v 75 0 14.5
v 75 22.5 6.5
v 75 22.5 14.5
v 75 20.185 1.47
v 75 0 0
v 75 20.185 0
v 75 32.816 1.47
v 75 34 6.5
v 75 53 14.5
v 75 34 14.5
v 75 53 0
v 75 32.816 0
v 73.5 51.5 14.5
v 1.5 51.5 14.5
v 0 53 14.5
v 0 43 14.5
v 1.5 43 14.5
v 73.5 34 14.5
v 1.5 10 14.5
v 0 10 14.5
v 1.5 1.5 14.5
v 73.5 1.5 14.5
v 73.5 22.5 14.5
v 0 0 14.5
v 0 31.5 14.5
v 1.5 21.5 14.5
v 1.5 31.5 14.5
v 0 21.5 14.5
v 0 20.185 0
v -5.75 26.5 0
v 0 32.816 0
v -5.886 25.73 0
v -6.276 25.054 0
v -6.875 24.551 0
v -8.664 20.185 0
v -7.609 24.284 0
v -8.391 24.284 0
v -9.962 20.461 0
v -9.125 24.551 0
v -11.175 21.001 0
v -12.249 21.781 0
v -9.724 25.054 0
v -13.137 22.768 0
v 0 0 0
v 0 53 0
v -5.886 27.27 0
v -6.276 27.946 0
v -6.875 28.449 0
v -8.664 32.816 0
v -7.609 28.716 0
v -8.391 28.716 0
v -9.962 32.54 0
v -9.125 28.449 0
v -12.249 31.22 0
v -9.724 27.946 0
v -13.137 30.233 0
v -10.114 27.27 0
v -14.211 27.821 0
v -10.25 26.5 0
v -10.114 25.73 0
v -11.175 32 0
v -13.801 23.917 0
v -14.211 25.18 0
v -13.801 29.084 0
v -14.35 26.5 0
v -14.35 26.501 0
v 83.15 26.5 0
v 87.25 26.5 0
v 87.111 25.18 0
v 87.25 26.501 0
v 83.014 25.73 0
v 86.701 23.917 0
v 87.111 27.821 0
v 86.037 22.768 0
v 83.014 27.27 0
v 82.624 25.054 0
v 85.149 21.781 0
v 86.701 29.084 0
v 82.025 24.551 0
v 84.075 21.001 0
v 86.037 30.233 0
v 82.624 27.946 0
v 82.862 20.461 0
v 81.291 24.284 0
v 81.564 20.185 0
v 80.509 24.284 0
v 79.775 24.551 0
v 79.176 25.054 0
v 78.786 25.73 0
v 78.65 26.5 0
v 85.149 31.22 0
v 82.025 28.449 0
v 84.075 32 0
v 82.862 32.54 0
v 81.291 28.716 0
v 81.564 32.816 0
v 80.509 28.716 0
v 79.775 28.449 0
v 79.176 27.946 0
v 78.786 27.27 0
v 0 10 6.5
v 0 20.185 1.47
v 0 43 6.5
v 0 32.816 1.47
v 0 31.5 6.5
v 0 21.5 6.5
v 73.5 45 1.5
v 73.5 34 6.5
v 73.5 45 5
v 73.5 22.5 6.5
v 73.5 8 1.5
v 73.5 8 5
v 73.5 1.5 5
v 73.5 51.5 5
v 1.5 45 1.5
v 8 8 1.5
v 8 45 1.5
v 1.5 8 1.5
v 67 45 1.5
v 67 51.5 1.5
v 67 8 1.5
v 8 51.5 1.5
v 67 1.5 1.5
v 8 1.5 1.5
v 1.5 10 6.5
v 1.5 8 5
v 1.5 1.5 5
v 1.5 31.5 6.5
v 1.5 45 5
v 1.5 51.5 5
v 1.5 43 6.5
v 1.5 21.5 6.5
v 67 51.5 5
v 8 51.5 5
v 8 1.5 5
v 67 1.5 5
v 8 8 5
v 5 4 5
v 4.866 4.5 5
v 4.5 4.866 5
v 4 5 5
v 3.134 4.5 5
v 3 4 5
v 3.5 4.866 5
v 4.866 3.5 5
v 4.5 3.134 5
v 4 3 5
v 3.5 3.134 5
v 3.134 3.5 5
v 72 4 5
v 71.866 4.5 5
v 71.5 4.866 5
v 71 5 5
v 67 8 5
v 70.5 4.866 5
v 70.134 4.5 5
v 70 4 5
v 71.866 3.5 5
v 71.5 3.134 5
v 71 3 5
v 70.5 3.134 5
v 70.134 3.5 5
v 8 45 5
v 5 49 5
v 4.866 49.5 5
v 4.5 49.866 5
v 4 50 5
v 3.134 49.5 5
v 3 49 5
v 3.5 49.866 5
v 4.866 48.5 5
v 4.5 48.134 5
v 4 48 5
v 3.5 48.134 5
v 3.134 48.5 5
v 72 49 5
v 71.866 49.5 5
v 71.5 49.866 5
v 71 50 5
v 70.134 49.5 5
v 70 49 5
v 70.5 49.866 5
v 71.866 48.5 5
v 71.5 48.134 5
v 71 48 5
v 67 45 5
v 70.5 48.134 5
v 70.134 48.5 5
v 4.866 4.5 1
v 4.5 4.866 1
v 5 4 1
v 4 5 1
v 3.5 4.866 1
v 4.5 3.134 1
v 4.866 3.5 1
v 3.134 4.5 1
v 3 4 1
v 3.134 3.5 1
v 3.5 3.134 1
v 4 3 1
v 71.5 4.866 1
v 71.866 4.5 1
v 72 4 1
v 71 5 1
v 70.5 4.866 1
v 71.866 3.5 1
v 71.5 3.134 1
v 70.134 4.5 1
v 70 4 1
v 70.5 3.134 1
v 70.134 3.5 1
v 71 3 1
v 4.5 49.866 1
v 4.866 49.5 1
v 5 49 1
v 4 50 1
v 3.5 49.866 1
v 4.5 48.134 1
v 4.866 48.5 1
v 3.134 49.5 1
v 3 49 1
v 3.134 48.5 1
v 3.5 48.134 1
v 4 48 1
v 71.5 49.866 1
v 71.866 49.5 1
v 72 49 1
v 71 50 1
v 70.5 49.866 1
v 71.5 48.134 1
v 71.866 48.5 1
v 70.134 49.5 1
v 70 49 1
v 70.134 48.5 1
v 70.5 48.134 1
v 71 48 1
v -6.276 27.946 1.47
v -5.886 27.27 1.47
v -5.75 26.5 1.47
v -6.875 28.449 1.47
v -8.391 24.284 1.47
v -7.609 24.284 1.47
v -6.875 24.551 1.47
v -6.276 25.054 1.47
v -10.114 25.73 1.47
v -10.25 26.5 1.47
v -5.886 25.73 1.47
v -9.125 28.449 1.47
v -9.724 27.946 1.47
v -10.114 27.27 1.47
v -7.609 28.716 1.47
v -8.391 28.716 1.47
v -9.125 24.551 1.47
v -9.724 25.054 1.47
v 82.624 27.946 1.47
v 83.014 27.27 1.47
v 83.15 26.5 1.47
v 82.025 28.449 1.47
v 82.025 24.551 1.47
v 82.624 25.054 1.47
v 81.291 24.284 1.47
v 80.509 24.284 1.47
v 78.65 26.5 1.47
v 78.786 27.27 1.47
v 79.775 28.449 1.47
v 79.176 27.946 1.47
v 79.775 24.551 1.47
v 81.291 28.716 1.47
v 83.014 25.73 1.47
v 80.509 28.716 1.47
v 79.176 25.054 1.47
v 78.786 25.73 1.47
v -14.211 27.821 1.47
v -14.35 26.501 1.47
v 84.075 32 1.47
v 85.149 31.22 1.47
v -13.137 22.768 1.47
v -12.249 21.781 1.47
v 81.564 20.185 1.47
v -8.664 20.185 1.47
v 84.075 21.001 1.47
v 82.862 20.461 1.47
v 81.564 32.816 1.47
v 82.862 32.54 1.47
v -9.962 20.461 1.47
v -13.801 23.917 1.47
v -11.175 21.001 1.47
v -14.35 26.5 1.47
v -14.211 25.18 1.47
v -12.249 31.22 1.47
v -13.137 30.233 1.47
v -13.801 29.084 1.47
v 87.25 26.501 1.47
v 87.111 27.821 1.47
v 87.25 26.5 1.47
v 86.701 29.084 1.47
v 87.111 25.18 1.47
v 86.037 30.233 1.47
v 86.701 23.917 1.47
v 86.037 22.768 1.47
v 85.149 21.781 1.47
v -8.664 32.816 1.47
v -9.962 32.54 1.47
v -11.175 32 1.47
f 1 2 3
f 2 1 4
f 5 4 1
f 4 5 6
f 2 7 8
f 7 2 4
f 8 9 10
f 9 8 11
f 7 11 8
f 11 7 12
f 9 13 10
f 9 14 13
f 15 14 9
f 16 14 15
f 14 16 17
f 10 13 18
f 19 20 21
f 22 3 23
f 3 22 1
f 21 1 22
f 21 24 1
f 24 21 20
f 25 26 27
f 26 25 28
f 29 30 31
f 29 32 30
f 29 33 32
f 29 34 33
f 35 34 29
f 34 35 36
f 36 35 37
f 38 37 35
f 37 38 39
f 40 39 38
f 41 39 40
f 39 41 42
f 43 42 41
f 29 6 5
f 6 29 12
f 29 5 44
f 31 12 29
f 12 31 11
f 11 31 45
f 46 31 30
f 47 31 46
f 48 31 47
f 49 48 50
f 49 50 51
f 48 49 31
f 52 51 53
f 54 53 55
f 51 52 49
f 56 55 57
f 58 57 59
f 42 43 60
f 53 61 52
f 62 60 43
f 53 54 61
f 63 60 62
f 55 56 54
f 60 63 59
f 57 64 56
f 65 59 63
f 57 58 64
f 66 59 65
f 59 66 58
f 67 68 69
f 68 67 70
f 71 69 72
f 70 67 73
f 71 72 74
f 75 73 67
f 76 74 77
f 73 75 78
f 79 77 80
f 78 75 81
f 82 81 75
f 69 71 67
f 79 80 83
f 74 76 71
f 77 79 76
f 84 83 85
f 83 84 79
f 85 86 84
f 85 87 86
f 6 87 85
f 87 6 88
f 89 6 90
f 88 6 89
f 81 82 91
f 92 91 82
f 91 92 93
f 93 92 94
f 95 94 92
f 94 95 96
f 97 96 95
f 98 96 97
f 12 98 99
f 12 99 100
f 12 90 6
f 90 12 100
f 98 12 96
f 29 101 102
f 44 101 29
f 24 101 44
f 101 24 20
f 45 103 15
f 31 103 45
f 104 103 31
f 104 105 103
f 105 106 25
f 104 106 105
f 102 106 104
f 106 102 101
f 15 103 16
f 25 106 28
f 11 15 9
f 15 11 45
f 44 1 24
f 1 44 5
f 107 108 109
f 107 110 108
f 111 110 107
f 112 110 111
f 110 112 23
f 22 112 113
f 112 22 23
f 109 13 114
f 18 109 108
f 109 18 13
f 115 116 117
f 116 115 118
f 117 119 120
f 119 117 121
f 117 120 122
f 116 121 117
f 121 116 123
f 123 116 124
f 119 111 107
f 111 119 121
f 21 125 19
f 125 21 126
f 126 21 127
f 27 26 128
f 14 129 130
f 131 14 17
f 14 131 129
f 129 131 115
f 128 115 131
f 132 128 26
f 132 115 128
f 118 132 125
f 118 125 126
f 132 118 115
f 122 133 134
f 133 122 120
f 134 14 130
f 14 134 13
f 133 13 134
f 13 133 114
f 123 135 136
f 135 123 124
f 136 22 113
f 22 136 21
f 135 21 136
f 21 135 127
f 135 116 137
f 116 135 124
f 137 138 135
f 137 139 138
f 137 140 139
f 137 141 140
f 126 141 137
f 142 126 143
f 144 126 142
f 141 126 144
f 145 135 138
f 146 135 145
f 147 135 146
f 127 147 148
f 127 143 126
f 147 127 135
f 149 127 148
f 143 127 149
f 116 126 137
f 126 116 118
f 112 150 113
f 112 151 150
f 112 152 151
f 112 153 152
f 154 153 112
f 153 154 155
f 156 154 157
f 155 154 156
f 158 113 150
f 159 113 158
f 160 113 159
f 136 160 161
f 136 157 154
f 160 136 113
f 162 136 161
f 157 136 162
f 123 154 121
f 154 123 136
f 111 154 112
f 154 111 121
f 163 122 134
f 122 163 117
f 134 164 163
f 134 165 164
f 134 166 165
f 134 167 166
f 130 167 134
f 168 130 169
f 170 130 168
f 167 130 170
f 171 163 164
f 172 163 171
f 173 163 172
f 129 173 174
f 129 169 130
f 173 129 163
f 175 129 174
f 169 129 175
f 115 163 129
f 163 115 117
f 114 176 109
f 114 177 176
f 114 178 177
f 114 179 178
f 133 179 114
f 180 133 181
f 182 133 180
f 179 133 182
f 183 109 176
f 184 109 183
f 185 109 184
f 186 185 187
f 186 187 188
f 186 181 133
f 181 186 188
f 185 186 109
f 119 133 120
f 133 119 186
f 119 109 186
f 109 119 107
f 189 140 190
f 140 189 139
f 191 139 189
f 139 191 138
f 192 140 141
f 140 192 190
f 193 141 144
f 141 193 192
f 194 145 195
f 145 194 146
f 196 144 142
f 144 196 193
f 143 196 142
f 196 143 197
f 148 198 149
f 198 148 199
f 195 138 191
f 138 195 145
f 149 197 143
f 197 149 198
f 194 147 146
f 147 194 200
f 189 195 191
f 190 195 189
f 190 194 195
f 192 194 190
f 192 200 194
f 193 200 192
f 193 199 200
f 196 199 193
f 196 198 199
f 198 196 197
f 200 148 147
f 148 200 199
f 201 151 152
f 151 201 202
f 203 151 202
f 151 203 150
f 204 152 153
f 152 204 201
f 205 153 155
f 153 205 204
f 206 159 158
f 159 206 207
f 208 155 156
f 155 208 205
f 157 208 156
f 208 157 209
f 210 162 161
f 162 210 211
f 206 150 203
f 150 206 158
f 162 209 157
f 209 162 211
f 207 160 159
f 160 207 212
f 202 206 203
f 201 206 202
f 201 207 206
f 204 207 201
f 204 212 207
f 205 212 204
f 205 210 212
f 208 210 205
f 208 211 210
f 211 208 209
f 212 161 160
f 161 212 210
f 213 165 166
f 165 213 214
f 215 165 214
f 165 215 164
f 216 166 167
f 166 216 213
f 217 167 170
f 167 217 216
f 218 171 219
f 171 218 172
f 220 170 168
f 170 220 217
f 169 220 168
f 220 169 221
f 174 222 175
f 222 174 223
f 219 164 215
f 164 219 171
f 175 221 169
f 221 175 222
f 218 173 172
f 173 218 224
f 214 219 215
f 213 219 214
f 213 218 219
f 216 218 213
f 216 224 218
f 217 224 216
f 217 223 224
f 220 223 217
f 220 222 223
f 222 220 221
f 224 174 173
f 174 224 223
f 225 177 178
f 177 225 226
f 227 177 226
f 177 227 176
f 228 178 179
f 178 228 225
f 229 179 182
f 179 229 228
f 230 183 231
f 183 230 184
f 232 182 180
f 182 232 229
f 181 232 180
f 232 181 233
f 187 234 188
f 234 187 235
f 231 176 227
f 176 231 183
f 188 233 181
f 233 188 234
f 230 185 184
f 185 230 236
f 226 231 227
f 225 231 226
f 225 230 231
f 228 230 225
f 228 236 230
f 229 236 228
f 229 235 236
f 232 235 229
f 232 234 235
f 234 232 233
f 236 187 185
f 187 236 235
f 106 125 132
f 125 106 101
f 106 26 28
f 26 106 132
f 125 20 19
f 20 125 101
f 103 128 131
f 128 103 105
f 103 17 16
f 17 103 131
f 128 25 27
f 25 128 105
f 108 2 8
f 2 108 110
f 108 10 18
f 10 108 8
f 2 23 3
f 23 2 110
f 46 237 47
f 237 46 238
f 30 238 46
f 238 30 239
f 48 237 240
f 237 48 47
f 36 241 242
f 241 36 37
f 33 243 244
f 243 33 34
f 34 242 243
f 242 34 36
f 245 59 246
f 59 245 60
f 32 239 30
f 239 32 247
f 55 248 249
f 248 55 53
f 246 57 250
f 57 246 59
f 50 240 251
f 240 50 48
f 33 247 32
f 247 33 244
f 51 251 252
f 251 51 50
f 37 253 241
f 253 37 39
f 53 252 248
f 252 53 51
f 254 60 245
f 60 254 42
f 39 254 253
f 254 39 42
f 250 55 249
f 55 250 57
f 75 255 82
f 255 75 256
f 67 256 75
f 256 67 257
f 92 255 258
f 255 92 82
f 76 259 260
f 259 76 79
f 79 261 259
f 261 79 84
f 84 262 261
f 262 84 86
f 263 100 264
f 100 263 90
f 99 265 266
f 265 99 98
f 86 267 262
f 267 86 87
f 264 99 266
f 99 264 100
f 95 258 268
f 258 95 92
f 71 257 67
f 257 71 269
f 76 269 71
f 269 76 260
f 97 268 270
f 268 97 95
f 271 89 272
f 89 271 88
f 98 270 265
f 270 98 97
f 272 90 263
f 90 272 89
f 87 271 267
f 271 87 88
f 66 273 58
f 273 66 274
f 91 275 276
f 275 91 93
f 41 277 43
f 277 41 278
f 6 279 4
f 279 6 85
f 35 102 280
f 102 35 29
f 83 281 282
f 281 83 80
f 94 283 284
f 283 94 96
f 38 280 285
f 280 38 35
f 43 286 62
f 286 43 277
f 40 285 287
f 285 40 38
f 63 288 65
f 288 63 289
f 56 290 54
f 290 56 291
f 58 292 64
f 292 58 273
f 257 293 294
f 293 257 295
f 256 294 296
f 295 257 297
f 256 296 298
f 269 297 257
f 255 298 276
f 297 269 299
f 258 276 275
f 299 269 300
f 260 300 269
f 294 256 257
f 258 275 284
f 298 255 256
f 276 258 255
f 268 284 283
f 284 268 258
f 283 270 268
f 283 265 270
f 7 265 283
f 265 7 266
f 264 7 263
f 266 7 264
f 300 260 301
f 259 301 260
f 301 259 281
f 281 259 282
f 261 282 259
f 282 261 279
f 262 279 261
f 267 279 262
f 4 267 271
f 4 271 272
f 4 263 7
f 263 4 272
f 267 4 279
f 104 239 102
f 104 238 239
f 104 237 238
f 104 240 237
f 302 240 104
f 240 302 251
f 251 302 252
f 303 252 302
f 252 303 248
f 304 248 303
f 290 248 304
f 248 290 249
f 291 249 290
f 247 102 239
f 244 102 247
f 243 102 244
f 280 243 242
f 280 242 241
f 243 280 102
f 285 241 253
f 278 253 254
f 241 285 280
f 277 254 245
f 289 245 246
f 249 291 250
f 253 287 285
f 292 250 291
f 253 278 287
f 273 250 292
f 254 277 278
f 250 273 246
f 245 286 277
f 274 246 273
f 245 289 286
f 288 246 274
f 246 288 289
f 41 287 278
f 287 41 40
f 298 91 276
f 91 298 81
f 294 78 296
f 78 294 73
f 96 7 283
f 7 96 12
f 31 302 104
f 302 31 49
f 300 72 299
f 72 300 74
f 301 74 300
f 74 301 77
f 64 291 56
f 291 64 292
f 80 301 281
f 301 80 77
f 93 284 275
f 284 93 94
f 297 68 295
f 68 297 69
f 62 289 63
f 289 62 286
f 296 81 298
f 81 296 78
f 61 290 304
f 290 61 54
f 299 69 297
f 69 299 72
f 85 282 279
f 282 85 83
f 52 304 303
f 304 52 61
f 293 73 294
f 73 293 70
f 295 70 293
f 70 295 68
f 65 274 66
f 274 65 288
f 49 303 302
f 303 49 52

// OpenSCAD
difference(){
union(){
difference(){
    cube([75,53,14.5]);
    translate([1.5,1.5,1.5])cube([72,50,20]);
}

translate([0,0,0])cube([8,8,5]);
translate([67,0,0])cube([8,8,5]);
translate([0,45,0])cube([8,8,5]);
translate([67,45,0])cube([8,8,5]);
}
translate([4,4,1])cylinder(d=2,h=5,$fn=12);
translate([71,4,1])cylinder(d=2,h=5,$fn=12);
translate([4,49,1])cylinder(d=2,h=5,$fn=12);
translate([71,49,1])cylinder(d=2,h=5,$fn=12);

translate([-1,10,6.5])cube([5,11.5,20]);
translate([-1,31.5,6.5])cube([5,11.5,20]);
translate([72,22.5,6.5])cube([5,11.5,20]);
}

scale([1,1,0.49])translate([-8,26.5,0])meccano(8);

module meccano(n=2){
difference(){
    minkowski(){
        cylinder(d=12.7,h=3,$fn=30);
        cube([(n-1)*12.7,.001,0.001]);
    }
    for (i=[0:n-1]){
        translate([i*12.7,0,-1])cylinder(d=4.5,h=5,$fn=18);
    }
}
}
